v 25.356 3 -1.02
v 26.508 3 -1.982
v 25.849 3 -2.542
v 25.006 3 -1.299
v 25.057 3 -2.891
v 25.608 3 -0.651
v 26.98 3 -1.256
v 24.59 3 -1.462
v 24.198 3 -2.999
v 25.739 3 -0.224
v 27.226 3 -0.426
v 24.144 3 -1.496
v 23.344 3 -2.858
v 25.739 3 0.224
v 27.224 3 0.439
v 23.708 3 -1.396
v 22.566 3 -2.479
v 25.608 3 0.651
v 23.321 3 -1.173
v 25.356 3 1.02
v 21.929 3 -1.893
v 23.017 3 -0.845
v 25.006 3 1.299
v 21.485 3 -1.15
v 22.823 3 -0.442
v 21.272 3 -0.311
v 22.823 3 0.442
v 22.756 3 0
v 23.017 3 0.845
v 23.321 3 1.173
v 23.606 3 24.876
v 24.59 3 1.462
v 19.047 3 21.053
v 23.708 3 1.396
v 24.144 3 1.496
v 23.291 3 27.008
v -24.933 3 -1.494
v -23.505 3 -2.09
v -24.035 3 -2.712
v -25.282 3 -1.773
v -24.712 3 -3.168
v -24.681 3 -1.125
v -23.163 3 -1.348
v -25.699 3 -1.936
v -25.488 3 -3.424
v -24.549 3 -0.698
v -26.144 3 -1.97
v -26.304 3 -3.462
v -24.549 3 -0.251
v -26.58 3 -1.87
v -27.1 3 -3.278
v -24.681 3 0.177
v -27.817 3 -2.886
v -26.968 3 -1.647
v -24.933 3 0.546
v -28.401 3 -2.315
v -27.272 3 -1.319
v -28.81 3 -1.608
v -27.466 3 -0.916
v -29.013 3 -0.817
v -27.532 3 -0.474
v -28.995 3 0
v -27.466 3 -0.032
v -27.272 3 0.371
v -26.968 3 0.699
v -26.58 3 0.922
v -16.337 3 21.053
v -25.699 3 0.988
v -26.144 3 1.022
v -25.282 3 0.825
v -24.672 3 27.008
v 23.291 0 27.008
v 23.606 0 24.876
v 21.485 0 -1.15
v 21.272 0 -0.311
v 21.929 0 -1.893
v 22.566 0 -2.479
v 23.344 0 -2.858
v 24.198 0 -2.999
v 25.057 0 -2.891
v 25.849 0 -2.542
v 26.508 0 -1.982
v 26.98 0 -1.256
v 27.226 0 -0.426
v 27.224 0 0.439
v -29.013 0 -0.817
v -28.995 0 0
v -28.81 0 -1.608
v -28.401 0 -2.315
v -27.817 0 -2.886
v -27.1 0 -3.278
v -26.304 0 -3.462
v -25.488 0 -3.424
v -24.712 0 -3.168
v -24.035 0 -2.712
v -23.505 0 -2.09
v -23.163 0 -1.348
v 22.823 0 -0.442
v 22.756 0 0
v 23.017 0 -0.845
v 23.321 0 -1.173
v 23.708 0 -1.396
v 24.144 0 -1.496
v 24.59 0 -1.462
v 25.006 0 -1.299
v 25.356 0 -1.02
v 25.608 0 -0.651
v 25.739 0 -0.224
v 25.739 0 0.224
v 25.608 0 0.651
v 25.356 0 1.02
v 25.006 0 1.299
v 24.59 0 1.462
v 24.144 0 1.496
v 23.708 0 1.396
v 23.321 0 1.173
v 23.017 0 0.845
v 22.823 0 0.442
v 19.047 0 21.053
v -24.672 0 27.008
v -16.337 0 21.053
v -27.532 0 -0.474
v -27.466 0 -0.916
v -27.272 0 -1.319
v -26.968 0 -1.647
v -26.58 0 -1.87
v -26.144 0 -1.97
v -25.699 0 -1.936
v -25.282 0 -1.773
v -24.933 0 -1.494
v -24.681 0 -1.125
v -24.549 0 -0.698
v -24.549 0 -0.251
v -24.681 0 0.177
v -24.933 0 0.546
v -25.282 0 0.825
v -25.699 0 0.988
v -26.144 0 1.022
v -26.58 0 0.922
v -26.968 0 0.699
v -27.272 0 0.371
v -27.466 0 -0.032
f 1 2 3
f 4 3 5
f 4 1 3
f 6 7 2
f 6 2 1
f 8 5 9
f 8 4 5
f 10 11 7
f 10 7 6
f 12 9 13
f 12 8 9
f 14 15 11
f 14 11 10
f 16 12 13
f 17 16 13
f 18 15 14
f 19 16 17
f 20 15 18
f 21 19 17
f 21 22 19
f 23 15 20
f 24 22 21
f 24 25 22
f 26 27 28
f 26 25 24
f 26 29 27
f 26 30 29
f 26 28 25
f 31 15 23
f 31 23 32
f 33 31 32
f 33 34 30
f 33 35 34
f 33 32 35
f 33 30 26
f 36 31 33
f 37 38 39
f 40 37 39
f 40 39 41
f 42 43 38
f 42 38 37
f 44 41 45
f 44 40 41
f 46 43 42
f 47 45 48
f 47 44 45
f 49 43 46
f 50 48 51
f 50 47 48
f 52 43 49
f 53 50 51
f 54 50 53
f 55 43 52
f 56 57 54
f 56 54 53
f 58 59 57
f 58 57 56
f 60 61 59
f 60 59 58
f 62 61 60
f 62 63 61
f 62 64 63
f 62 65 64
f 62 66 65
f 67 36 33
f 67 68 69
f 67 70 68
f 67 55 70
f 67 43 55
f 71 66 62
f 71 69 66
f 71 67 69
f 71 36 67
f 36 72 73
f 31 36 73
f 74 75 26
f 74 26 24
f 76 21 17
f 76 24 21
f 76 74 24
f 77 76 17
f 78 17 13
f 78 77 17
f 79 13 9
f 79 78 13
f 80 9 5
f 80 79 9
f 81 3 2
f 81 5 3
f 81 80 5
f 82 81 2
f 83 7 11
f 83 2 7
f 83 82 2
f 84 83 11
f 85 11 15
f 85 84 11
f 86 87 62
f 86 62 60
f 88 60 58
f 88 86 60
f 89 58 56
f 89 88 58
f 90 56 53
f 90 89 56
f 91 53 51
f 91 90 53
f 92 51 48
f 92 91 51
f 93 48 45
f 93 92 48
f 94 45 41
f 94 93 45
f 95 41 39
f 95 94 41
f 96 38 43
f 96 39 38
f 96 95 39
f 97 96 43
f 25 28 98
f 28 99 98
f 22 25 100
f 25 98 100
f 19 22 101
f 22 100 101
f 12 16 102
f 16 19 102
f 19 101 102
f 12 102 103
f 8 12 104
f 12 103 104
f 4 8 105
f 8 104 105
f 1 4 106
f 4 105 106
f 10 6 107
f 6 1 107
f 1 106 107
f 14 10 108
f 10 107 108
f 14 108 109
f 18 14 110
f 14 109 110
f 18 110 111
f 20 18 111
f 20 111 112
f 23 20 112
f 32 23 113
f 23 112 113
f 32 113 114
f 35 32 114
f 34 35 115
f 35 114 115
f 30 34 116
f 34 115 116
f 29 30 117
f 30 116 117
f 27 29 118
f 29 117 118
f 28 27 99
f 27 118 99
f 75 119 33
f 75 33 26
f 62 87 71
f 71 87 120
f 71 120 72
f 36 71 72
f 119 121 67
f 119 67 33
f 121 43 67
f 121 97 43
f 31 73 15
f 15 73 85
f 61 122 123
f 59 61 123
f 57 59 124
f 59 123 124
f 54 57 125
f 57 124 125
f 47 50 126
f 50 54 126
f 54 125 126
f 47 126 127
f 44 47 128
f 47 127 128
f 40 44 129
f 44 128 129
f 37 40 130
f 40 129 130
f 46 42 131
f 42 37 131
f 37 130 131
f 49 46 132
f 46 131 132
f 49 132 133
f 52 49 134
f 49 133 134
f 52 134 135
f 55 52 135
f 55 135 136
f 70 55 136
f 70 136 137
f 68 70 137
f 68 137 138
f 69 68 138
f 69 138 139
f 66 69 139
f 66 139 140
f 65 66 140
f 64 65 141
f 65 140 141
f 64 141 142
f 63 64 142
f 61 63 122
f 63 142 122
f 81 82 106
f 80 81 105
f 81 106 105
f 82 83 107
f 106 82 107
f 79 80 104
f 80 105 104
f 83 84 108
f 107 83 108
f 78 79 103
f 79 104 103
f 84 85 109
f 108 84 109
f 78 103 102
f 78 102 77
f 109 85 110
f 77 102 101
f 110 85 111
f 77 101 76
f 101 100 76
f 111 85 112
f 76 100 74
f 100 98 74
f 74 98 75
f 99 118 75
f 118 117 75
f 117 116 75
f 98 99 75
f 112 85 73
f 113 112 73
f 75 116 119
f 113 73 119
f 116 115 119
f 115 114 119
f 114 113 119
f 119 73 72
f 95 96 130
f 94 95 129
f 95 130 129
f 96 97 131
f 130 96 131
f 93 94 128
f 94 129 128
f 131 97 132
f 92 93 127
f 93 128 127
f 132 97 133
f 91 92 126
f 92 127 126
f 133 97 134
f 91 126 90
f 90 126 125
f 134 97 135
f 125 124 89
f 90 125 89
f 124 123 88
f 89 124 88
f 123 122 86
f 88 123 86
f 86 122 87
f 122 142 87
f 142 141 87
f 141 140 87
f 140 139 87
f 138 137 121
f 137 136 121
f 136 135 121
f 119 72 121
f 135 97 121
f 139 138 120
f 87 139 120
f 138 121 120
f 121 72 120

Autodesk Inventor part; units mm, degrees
ref_plane "YZ Plane" through (0, 0, 0) normal (1, 0, 0) x (0, 1, 0)
ref_plane "XZ Plane" through (0, 0, 0) normal (0, 1, 0) x (-1, 0, 0)
ref_plane "XY Plane" through (0, 0, 0) normal (0, 0, 1) x (1, 0, 0)
sketch "Sketch1" plane through (0, 0, 0) normal (0, 1, 0) x (-1, 0, 0)
  circle A0 centre (26.0324, -0.4741) radius 1.5
  circle A1 centre (-24.2562, 0) radius 3
  circle A2 centre (-24.2562, 0) radius 1.5
  circle A3 centre (26.0324, -0.4741) radius 3
  line L0 (0, 0) -> (-28.1337, 0) construction
  line L1 (0, 0) -> (28.9947, 0) construction
  line L2 (28.9947, 0) -> (24.6719, 27.0084)
  line L3 (-23.6062, 24.8761) -> (-27.2238, 0.4393)
  line L4 (23.1627, -1.3485) -> (16.3374, 21.053)
  line L5 (16.3374, 21.053) -> (-19.0472, 21.053)
  line L6 (-19.0472, 21.053) -> (-21.2723, -0.3108)
  line L7 (24.6719, 27.0084) -> (-23.2906, 27.0084)
  line L8 (-23.2906, 27.0084) -> (-23.6062, 24.8761)
  dimension "d8" = 3
  dimension "d9" = 6
  dimension "d10" = 3
  dimension "d12" = 6
  dimension "d13" = 180
extrude "Extrusion1" add sketch "Sketch1" along normal blind 3
properties part number "barra_c"
